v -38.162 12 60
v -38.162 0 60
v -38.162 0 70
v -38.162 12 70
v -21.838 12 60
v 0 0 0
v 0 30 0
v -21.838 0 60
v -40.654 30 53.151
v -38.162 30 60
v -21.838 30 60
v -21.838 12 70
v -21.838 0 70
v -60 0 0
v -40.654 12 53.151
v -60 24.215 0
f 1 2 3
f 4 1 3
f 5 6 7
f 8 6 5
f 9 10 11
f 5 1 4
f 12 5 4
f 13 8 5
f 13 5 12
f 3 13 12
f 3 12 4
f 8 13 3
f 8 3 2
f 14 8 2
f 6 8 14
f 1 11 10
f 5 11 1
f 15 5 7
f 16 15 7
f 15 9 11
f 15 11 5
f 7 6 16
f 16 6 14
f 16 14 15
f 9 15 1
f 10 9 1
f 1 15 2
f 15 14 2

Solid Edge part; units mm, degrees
sketch "Sketch1" plane through (0, 0, 0) normal (0, -1, 0) x (1, 0, 0)
  line L0 (0, 0) -> (-21.8382, 60)
  line L1 (-21.8382, 60) -> (-21.8382, 70)
  line L2 (-21.8382, 70) -> (-38.1618, 70)
  line L3 (-38.1618, 60) -> (-38.1618, 70)
  line L4 (-60, 0) -> (-38.1618, 60)
  line L5 (0, 0) -> (-60, 0)
extrude "Protrusion1" add sketch "Sketch1" against normal blind 30
sketch "Sketch2" plane through (-21.8382, 15, 65) normal (1, 0, 0) x (0, 0, 1)
  line L0 (-5, 3) -> (5, 3)
  line L1 (5, 3) -> (5, -15)
  line L2 (5, -15) -> (-5, -15)
  line L3 (-5, -15) -> (-5, 3)
extrude "ExtrudedCutout_2" cut sketch "Sketch2" against normal blind 20
sketch "Sketch3" plane through (-10.9191, 15, 30) normal (0.9397, 0, 0.342) x (0, 1, 0)
  line L0 (-3, 31.9253) -> (15, -31.9253)
  line L1 (15, -31.9253) -> (15, 31.9253)
  line L2 (15, 31.9253) -> (-3, 31.9253)
extrude "ExtrudedCutout_3" cut sketch "Sketch3" against normal blind 68.6414
